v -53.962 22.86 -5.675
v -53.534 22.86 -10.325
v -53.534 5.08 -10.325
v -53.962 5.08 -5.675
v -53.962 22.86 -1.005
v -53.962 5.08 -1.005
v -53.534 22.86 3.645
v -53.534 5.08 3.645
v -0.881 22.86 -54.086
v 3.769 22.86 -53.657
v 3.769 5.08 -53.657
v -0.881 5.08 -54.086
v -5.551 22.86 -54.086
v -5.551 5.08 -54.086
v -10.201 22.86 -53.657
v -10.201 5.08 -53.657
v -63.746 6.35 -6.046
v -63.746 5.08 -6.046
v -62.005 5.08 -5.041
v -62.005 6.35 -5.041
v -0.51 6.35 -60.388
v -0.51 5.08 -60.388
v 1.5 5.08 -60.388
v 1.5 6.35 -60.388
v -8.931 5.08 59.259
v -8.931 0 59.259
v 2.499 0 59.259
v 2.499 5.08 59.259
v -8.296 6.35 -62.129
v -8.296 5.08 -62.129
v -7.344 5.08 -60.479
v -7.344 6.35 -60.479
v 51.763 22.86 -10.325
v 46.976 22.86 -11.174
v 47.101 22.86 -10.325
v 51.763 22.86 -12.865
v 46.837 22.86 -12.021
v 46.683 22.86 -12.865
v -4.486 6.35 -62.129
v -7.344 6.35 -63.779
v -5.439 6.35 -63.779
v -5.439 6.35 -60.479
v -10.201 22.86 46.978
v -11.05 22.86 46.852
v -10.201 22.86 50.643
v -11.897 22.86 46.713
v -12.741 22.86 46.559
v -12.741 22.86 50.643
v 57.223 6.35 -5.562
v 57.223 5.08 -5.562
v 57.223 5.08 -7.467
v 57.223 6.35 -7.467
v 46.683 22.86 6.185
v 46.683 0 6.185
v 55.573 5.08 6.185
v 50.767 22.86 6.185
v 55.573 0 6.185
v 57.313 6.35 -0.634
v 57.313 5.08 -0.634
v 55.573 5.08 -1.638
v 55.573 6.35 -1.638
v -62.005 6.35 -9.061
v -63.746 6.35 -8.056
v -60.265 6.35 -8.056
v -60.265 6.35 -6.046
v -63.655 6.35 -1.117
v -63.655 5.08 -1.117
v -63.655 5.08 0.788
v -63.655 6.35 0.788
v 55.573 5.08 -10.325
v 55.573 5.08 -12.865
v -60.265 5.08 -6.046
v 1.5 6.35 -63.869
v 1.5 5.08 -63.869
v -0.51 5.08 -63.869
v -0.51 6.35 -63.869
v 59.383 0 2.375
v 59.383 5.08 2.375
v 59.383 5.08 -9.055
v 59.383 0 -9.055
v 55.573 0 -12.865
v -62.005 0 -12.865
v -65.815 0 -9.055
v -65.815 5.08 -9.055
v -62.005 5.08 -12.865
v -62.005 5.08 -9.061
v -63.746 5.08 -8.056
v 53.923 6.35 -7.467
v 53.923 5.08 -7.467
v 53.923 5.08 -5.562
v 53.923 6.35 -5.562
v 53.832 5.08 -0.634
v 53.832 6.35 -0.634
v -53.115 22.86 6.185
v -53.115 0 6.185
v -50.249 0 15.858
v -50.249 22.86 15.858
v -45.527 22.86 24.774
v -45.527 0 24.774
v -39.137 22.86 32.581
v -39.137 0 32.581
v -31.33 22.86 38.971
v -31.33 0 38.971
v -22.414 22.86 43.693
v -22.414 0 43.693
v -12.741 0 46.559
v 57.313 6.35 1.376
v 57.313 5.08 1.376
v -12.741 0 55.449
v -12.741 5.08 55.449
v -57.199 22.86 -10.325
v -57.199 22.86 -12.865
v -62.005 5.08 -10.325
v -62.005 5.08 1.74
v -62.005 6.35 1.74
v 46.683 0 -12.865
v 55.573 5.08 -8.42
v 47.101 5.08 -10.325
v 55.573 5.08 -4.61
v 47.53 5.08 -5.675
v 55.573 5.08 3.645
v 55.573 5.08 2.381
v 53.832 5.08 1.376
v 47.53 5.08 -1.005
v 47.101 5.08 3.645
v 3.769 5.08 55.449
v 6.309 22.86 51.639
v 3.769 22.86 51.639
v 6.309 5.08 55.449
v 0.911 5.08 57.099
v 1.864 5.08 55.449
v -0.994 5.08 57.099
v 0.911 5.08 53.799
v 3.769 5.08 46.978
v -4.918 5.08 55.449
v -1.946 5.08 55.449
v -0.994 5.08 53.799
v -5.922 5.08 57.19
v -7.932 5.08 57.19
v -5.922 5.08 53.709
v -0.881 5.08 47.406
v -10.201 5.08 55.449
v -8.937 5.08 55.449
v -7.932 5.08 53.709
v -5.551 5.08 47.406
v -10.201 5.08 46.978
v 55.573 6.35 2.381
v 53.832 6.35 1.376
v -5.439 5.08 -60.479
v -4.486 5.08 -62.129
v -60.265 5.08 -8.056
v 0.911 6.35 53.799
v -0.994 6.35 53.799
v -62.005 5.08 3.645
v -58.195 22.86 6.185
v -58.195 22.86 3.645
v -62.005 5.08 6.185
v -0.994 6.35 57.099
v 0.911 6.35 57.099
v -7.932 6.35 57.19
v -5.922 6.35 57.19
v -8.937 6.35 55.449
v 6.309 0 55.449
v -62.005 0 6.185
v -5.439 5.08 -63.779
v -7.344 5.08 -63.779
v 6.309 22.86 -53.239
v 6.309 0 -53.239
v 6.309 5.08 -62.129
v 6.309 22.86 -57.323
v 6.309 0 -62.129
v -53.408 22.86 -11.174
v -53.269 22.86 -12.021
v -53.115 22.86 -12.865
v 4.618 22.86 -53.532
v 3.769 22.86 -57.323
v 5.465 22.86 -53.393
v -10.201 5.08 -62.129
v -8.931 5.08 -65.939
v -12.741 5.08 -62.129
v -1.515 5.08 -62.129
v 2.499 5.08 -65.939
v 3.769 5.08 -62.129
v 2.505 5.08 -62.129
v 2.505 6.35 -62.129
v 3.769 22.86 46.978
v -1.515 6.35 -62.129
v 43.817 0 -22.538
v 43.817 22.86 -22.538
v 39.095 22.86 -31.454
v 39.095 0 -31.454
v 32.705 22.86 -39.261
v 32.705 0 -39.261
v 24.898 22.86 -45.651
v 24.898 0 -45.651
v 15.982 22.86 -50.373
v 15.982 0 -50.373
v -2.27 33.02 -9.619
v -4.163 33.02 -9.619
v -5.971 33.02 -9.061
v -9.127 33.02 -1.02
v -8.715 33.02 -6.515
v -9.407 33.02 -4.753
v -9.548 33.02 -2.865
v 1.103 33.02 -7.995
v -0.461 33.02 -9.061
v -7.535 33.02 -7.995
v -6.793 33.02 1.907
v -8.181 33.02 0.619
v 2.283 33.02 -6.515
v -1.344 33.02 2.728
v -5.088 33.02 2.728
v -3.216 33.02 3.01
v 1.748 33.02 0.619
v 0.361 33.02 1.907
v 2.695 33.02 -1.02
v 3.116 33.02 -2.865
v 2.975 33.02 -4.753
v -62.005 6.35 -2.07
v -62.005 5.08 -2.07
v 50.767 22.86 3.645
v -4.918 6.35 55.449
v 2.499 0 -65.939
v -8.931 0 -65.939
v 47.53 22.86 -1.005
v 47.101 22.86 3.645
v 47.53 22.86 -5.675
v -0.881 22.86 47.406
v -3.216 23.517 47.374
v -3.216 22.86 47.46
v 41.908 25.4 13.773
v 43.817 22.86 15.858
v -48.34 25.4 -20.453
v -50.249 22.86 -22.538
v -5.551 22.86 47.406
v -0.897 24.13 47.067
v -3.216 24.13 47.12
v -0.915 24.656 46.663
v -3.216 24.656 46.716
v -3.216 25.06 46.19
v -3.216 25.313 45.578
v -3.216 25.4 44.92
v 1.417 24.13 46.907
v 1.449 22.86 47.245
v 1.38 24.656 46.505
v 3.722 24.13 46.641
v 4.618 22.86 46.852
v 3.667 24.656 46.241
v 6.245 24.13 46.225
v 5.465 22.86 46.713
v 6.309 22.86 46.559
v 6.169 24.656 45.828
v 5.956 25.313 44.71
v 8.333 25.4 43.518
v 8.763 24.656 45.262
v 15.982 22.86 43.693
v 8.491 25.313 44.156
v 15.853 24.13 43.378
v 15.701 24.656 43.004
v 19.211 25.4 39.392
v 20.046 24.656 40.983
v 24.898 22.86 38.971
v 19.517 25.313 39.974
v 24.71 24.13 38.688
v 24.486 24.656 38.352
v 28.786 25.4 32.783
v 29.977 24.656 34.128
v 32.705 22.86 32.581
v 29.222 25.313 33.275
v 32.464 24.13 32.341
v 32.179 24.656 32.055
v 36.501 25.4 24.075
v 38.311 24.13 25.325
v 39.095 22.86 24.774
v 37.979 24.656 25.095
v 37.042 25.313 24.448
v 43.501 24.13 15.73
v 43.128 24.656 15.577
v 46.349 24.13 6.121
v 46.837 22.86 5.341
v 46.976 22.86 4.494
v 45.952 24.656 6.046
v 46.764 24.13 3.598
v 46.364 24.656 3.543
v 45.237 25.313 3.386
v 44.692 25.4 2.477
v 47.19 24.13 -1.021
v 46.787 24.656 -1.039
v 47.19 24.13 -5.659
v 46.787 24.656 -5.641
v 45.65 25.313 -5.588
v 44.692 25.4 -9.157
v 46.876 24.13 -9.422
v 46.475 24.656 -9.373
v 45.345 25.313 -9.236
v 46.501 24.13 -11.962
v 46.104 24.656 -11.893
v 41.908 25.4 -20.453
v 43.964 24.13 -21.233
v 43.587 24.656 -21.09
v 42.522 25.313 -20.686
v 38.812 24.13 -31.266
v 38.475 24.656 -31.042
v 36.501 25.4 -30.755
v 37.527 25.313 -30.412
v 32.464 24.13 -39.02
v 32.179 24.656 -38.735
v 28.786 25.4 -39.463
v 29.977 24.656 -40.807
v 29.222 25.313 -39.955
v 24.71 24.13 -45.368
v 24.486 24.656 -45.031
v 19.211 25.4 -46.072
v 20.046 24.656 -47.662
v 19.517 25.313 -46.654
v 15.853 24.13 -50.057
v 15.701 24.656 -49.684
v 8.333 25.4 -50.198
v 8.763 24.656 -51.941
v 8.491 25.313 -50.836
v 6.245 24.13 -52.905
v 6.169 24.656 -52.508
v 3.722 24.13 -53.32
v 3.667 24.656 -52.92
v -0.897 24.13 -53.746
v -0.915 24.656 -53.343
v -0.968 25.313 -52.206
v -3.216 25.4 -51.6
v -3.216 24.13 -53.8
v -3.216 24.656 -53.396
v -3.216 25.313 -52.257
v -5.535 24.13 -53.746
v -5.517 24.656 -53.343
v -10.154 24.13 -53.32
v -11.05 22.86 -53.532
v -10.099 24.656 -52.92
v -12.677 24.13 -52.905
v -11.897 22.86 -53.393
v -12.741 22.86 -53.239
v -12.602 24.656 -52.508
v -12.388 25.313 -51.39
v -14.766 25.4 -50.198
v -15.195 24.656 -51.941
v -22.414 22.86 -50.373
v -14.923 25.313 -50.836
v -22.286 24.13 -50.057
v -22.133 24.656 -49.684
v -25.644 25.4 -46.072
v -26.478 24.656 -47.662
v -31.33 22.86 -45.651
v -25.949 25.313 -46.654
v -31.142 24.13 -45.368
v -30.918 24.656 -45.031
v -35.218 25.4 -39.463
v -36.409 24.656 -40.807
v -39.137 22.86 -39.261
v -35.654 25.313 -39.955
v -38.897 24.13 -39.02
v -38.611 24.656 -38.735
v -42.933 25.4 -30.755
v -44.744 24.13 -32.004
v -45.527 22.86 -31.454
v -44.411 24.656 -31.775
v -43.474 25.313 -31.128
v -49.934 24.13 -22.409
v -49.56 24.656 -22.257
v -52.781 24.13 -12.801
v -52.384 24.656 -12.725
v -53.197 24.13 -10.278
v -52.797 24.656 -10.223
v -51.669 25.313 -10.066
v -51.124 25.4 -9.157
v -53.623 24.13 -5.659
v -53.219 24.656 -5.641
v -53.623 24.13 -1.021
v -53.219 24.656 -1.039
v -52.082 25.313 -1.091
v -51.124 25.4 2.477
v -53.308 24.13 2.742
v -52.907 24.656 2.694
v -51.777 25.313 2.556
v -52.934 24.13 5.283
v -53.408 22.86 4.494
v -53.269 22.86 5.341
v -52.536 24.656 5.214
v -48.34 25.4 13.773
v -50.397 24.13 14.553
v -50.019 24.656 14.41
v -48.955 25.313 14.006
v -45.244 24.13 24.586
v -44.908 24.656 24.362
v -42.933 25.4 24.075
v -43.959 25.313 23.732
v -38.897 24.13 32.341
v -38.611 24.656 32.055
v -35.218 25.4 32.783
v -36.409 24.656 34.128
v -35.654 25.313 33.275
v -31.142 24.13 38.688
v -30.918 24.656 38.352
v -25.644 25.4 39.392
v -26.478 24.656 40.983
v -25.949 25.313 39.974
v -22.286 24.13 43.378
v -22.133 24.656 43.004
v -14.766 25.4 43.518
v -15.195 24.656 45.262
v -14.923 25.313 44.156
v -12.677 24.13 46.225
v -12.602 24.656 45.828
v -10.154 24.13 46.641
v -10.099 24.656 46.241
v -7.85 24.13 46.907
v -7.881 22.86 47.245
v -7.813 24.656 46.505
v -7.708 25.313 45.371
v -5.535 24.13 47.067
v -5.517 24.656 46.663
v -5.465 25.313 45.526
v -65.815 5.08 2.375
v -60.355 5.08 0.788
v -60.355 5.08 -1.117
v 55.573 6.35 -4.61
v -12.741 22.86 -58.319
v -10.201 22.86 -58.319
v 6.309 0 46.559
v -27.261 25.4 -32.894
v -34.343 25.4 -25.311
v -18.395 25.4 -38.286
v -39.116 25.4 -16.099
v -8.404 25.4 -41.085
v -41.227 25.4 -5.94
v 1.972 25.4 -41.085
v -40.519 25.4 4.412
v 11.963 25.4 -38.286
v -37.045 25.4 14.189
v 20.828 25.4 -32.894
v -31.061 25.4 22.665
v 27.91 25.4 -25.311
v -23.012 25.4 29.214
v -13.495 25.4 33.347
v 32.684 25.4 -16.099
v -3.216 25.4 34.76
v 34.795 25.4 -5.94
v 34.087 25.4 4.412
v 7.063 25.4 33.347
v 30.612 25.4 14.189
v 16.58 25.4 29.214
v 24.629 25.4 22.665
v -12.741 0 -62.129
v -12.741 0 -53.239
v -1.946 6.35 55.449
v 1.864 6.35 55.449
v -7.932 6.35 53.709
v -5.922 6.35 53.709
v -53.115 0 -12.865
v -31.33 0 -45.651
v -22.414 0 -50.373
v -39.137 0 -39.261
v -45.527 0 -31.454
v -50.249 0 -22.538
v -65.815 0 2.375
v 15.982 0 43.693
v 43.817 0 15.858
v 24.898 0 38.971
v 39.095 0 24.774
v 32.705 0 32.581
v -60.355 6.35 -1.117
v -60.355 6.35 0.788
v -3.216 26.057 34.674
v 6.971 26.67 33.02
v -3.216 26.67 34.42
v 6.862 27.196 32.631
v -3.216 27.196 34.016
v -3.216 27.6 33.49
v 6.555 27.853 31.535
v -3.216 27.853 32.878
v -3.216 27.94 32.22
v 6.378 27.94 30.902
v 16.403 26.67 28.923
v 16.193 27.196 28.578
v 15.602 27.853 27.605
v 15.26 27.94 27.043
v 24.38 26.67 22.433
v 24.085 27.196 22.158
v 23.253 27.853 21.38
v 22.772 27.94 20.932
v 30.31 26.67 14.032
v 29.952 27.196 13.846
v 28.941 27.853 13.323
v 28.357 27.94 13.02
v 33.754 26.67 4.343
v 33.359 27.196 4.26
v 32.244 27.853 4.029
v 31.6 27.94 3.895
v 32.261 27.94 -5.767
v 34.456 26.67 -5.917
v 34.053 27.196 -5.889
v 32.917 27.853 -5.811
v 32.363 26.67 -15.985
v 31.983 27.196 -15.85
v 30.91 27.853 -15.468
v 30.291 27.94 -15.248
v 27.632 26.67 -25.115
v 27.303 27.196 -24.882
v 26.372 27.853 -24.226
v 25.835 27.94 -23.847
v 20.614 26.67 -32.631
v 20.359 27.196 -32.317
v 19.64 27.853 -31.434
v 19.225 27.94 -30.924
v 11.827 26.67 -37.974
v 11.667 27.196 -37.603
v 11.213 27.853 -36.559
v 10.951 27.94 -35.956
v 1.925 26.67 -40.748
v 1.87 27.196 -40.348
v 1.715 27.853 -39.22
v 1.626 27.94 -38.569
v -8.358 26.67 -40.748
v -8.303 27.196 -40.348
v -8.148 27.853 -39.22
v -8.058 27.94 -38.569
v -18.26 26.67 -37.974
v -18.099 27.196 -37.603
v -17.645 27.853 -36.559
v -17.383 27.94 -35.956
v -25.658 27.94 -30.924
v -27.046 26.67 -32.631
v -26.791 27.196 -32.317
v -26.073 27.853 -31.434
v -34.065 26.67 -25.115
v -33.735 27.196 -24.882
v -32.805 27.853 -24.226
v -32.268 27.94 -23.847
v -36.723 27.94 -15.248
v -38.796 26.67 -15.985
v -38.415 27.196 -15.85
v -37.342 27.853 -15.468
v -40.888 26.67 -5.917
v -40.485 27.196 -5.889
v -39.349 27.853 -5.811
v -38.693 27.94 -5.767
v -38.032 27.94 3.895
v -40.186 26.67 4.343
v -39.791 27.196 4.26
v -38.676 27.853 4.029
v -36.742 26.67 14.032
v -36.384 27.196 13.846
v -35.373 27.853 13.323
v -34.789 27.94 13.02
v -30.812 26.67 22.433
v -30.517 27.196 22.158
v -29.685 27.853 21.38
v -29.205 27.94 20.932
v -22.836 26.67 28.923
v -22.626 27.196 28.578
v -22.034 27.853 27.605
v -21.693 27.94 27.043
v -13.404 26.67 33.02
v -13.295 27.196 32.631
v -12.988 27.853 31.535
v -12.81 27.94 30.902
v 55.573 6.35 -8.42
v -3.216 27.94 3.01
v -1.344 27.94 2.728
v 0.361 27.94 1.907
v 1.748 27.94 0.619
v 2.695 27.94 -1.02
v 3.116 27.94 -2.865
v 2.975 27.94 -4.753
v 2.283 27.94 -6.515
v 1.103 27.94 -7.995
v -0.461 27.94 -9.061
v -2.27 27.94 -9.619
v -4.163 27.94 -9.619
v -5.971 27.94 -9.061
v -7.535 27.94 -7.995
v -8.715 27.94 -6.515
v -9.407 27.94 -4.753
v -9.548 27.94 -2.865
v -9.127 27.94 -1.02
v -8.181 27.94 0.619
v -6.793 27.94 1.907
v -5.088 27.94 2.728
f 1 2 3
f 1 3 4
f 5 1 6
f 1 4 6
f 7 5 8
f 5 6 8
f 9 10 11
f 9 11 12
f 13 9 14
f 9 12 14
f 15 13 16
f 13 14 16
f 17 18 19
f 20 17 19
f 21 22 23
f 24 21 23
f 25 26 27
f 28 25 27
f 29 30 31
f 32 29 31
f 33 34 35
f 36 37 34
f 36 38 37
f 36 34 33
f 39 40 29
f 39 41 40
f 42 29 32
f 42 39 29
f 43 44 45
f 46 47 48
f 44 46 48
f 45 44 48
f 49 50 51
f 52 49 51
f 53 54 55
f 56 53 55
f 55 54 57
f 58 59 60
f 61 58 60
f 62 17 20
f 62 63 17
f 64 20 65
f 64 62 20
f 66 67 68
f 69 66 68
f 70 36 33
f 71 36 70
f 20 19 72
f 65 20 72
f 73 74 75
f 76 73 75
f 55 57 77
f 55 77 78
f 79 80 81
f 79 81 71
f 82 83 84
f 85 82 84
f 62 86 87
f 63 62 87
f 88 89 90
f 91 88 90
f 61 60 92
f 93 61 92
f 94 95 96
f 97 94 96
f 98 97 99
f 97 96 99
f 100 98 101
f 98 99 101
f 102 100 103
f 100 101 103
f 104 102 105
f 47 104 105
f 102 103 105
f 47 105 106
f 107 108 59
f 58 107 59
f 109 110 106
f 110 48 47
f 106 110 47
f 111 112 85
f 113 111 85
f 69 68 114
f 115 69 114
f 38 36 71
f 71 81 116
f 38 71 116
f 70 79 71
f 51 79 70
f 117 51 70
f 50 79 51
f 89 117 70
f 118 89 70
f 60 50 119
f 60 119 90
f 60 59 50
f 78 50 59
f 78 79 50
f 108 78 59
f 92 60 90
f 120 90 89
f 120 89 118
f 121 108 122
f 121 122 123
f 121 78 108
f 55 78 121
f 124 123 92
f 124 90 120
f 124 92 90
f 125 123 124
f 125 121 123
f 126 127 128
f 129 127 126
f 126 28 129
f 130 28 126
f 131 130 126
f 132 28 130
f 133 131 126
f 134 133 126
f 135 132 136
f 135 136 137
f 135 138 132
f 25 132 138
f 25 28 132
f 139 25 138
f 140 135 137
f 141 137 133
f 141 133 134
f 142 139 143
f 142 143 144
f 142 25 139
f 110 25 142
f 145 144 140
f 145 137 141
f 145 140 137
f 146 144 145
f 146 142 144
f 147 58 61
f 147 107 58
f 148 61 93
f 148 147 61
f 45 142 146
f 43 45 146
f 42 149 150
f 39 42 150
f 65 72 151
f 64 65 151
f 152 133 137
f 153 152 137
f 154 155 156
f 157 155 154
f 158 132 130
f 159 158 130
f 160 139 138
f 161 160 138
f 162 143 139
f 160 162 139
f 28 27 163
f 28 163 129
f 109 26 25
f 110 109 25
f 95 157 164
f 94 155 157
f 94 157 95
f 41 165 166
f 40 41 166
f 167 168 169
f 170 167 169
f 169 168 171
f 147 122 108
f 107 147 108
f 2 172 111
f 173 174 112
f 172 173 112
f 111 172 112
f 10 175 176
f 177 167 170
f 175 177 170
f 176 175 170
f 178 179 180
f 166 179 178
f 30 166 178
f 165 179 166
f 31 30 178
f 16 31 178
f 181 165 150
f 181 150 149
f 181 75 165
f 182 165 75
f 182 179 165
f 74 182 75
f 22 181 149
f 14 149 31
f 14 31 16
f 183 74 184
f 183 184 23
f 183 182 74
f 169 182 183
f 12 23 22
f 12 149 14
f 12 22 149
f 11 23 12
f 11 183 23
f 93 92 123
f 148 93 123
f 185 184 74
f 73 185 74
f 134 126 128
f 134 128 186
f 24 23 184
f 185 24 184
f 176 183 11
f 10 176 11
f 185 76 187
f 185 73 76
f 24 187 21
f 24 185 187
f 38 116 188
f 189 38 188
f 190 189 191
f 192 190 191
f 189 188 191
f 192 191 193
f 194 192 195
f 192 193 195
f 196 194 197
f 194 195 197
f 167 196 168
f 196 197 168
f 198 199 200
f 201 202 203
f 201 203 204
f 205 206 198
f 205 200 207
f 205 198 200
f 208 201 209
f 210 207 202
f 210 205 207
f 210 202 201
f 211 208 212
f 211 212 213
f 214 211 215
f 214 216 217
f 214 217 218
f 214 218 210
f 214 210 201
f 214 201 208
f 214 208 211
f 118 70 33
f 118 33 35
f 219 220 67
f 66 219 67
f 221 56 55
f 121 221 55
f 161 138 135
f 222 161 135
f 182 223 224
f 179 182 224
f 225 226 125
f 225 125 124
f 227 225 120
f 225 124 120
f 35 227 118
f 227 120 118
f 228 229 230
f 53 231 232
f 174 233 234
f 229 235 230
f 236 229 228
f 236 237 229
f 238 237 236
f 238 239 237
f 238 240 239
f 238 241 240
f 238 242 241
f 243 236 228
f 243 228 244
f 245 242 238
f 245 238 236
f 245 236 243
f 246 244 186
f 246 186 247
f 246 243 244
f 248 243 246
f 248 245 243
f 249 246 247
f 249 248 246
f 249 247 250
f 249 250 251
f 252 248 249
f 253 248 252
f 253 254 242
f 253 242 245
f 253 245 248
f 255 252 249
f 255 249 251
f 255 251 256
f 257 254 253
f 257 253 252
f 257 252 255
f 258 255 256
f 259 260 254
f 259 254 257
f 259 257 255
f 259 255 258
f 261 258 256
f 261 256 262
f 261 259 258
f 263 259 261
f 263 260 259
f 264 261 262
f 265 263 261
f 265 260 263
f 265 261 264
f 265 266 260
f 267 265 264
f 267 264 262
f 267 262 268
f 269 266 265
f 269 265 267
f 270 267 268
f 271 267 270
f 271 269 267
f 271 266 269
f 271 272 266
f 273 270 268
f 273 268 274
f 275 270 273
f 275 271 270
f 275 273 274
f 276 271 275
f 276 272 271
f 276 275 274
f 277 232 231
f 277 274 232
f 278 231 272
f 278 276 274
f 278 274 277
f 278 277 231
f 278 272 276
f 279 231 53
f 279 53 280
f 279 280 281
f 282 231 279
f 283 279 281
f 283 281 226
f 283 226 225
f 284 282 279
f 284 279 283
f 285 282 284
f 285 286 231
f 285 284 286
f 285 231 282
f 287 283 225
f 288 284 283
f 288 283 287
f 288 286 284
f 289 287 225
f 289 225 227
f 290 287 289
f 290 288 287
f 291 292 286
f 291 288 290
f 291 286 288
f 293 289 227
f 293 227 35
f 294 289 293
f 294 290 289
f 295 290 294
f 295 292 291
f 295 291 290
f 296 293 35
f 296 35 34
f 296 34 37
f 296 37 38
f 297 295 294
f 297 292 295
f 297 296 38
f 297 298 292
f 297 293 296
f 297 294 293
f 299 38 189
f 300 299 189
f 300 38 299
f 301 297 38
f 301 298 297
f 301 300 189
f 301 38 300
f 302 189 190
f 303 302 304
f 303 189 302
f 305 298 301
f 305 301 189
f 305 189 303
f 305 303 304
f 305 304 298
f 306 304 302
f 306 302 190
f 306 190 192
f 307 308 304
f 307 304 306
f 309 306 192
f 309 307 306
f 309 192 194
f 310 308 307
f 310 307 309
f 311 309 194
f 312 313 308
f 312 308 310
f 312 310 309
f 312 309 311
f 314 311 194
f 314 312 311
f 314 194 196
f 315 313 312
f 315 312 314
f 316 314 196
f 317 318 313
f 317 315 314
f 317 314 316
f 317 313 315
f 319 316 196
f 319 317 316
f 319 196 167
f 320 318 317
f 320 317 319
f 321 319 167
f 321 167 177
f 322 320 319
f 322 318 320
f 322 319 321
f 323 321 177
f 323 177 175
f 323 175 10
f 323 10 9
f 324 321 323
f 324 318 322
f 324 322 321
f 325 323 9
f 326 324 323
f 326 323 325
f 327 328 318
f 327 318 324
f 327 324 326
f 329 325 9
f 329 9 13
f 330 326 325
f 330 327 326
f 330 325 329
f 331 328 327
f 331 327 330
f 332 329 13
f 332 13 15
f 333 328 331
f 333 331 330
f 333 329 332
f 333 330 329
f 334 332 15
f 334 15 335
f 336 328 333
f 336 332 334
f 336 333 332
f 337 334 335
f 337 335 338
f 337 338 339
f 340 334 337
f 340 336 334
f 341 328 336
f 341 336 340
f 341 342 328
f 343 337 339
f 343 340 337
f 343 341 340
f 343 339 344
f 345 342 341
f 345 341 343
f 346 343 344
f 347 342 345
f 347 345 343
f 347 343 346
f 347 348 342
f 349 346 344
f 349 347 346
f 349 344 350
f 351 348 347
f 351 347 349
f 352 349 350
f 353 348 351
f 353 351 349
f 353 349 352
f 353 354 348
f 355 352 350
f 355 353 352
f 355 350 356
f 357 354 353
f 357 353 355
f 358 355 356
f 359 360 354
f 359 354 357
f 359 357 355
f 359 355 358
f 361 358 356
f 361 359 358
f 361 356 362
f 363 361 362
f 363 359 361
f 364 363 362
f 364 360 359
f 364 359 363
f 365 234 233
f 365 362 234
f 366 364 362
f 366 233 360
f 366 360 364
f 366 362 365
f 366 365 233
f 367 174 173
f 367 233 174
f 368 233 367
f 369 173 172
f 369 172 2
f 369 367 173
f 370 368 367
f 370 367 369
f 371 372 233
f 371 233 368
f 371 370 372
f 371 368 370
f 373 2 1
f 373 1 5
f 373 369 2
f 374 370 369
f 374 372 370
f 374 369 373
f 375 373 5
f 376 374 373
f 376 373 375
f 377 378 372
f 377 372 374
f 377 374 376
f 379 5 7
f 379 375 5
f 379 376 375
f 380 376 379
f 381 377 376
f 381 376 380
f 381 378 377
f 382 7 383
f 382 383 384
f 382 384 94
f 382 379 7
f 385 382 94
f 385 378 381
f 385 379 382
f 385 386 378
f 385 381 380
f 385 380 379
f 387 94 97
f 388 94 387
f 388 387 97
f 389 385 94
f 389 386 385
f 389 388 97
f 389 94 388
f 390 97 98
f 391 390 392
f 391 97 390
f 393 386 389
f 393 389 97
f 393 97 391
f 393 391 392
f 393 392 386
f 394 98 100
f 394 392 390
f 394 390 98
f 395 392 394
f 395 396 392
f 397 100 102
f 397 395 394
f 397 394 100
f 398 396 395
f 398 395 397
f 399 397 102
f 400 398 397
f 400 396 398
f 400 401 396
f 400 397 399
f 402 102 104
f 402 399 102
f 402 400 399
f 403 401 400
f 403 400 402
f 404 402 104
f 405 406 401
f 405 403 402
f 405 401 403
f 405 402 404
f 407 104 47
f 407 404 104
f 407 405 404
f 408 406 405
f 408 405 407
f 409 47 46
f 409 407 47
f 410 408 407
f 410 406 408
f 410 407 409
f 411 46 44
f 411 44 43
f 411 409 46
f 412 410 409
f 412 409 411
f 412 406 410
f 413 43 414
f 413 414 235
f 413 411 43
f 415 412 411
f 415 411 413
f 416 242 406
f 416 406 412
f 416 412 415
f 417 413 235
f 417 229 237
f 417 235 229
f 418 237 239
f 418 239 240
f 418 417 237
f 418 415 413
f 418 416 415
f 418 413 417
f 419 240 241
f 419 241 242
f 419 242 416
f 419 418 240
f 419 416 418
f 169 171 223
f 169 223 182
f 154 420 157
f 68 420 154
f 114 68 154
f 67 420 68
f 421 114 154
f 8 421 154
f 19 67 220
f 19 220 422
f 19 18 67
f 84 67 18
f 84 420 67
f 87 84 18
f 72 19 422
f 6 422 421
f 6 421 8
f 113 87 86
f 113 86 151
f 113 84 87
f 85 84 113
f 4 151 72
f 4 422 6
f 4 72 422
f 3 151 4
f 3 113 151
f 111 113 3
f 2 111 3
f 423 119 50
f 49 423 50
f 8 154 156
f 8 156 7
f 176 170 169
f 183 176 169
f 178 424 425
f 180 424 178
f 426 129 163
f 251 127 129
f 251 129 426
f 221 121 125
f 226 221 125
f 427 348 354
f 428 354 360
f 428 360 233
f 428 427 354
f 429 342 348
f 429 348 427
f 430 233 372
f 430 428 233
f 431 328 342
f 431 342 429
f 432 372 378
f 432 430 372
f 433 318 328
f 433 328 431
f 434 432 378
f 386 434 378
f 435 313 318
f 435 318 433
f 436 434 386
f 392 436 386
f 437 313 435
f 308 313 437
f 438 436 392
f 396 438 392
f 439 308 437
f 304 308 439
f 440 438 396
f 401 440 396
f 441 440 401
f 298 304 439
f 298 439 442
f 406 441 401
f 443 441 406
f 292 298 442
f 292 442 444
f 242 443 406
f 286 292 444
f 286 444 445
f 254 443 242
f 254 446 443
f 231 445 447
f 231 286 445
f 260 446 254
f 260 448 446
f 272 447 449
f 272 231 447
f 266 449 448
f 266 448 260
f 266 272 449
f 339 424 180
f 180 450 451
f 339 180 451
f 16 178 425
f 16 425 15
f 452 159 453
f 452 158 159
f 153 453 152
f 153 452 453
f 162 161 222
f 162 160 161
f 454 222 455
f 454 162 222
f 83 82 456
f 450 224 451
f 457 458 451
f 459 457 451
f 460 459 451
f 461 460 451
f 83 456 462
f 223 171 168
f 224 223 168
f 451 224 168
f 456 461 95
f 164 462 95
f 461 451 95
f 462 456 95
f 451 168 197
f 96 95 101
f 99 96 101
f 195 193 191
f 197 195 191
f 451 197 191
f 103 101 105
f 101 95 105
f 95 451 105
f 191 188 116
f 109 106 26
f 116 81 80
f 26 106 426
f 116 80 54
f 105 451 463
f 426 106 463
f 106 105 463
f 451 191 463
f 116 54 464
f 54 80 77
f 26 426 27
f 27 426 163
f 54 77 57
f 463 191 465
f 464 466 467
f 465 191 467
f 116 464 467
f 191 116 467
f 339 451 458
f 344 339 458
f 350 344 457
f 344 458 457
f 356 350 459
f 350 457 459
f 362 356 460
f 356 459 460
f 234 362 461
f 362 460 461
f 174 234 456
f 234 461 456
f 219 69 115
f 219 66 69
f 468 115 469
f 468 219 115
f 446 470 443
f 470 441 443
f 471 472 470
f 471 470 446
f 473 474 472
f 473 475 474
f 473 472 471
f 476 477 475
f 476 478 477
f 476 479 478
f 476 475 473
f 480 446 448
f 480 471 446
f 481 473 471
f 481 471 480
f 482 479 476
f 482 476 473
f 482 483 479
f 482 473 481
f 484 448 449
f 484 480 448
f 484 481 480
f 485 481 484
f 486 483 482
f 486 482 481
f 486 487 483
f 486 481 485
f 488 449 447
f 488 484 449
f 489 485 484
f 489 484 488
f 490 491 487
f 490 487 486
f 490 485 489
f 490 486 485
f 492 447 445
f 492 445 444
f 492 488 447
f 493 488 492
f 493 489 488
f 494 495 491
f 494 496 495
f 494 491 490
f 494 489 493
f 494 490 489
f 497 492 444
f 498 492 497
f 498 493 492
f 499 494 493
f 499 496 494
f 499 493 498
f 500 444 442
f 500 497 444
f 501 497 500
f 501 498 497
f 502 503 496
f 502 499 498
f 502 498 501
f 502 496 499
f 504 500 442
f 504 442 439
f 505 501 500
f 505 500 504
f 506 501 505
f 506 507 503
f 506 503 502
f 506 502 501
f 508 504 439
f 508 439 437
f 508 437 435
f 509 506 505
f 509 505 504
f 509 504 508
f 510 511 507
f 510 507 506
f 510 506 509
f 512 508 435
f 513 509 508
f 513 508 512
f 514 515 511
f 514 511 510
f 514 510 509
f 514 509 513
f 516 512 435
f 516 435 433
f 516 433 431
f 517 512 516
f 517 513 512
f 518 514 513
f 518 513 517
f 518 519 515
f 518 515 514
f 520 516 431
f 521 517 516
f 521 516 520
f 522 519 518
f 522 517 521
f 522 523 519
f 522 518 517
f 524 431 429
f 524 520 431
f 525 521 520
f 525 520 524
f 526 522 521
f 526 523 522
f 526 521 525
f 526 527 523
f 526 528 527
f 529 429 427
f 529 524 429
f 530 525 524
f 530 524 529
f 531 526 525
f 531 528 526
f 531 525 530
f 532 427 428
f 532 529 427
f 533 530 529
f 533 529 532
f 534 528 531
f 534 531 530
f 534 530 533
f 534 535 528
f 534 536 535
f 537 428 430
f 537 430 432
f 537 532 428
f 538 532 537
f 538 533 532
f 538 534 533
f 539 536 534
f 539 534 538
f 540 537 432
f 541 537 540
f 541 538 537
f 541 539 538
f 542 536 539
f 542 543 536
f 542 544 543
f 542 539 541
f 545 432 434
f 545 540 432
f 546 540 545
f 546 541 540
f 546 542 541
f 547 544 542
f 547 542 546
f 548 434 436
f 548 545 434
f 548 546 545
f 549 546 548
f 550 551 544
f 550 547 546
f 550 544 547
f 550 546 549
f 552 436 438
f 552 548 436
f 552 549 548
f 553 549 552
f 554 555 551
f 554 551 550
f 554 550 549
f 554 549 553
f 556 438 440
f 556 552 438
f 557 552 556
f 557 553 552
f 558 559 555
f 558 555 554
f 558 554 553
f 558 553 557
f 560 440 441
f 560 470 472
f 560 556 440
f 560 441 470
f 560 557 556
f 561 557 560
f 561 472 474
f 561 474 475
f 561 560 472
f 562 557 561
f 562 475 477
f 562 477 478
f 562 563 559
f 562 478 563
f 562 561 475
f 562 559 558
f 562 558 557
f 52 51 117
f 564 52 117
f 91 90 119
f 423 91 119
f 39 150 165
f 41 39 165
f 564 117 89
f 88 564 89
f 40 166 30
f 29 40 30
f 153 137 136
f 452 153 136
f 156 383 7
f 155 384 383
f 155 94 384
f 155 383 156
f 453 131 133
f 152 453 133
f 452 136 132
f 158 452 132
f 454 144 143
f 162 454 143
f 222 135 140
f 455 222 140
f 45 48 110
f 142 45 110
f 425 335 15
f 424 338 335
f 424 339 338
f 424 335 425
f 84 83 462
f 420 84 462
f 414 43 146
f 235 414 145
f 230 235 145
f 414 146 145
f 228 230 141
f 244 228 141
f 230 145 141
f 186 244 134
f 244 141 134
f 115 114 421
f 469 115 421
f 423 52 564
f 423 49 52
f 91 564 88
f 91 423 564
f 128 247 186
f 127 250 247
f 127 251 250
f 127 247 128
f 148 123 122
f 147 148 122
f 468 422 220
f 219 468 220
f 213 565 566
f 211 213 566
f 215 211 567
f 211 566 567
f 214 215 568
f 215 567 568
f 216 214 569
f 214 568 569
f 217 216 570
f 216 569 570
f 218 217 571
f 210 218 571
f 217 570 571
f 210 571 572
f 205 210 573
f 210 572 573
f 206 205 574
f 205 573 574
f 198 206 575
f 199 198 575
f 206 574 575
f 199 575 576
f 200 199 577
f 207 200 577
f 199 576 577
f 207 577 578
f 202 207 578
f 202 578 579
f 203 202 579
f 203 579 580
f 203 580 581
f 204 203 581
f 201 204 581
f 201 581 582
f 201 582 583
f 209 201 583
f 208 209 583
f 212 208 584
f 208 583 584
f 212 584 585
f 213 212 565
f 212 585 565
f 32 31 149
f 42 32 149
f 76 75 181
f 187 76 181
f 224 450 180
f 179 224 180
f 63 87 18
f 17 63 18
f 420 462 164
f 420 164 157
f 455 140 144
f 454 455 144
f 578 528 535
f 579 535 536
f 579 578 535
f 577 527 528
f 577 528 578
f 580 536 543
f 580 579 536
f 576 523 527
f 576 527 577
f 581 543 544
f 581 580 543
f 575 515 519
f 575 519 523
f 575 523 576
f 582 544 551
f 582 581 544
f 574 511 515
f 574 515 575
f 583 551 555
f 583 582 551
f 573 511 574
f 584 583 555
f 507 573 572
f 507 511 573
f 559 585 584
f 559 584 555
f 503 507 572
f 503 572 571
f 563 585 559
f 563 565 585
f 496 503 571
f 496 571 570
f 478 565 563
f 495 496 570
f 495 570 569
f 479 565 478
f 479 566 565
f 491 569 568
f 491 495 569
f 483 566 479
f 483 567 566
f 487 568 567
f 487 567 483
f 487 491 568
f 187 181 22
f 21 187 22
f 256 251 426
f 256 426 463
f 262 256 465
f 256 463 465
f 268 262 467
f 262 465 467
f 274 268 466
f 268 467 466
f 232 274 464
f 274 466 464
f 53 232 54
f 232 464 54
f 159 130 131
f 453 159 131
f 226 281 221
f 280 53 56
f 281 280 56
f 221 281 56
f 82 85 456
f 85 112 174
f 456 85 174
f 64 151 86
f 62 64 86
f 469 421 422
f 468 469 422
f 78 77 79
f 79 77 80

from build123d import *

# Parameters (mm, degrees)
SKETCH2_R                    = 50.8
BOSS_EXTRUDE1_DEPTH          = 25.4
FILLET1_R                    = 2.54
BOSS_EXTRUDE2_START          = -25.4
BOSS_EXTRUDE2_DEPTH          = 5.08
CHAMFER1_SIZE                = 3.81
BOSS_EXTRUDE3_DEPTH          = 2.54
BOSS_EXTRUDE4_DEPTH          = 1.27
BOSS_EXTRUDE6_DEPTH          = 2.54
BOSS_EXTRUDE7_DEPTH          = 1.27
CIRPATTERN1_COUNT            = 4
CHAMFER1_OF_CIRPATTERN1_SIZE = 3.81
CIRPATTERN2_COUNT            = 4
SKETCH12_R                   = 38.1
BOSS_EXTRUDE8_DEPTH          = 2.54
FILLET2_R                    = 2.54
SKETCH13_R                   = 6.35
BOSS_EXTRUDE9_DEPTH          = 5.08


with BuildPart() as part:
    # Sketch2 → Boss-Extrude1 (new body)
    with BuildSketch(Plane(origin=(0, 0, 0), x_dir=(1, 0, 0), z_dir=(0, 1, 0))):
        with Locations(Location((-3.216165312, 3.339863978, 0), (0, 0, 270))):
            Circle(SKETCH2_R)
    extrude(amount=BOSS_EXTRUDE1_DEPTH)

    # Fillet1
    fillet1_edges = [part.edges().sort_by_distance(p)[0] for p in [
        (-3.216165312, 25.4, -54.139863978),
    ]]
    fillet(fillet1_edges, radius=FILLET1_R)

    # Sketch3 → Boss-Extrude2 (add)
    with BuildSketch(Plane(origin=(0, 25.4, 0), x_dir=(1, 0, 0), z_dir=(0, 1, 0)).offset(BOSS_EXTRUDE2_START)):
        with BuildLine():
            Line((-53.115207137, 12.864863978), (-65.815207137, 12.864863978))
            Line((-65.815207137, 12.864863978), (-65.815207137, -6.185136022))
            Line((-65.815207137, -6.185136022), (-53.115207137, -6.185136022))
            ThreePointArc((-53.115207137, -6.185136022), (-54.016165312, 3.339863978), (-53.115207137, 12.864863978))
        make_face()
    boss_extrude2 = extrude(amount=BOSS_EXTRUDE2_DEPTH)

    # Chamfer1
    chamfer1_edges = [part.edges().sort_by_distance(p)[0] for p in [
        (-65.815207137, 2.54, -12.864863978),
        (-65.815207137, 2.54, 6.185136022),
    ]]
    chamfer(chamfer1_edges, length=CHAMFER1_SIZE)

    # Sketch4 → Boss-Extrude3 (add)
    with BuildSketch(Plane.XY.offset(6.185136022)):
        Polygon((-53.115207137, 5.08), (-53.115207137, 22.86), (-58.195207137, 22.86), (-62.005207137, 5.08), align=None)
    boss_extrude3 = extrude(amount=-BOSS_EXTRUDE3_DEPTH)

    # Sketch5 → Boss-Extrude4 (add)
    with BuildSketch(Plane(origin=(0, 5.08, 0), x_dir=(1, 0, 0), z_dir=(0, 1, 0))):
        Polygon((-63.654985531, -0.787636022), (-62.005207137, -1.740136022), (-60.355428742, -0.787636022), (-60.355428742, 1.117363978), (-62.005207137, 2.069863978), (-63.654985531, 1.117363978), align=None)
    boss_extrude4 = extrude(amount=BOSS_EXTRUDE4_DEPTH)

    # Sketch10 → Boss-Extrude6 (add)
    with BuildSketch(Plane(origin=(0, 0, -12.864863978), x_dir=(-1, 0, 0), z_dir=(0, 0, -1))):
        Polygon((53.115207137, 5.08), (53.115207137, 22.86), (57.19920047, 22.86), (62.005207137, 5.08), align=None)
    boss_extrude6 = extrude(amount=-BOSS_EXTRUDE6_DEPTH)

    # Sketch11 → Boss-Extrude7 (add)
    with BuildSketch(Plane(origin=(0, 5.08, 0), x_dir=(1, 0, 0), z_dir=(0, 1, 0))):
        Polygon((-63.745716673, 6.046159142), (-62.005207137, 5.041275493), (-60.264697601, 6.046159142), (-60.264697601, 8.05592644), (-62.005207137, 9.060810089), (-63.745716673, 8.05592644), align=None)
    boss_extrude7 = extrude(amount=BOSS_EXTRUDE7_DEPTH)

    # CirPattern1: Boss-Extrude2, Boss-Extrude3, Boss-Extrude6 ×4 about axis
    cirpattern1_axis = Axis((-3.216165312, 0, -3.339863978), (0, 1, 0))
    add([boss_extrude2.rotate(cirpattern1_axis, i * 360 / CIRPATTERN1_COUNT) for i in range(1, CIRPATTERN1_COUNT)])
    add([boss_extrude3.rotate(cirpattern1_axis, i * 360 / CIRPATTERN1_COUNT) for i in range(1, CIRPATTERN1_COUNT)])
    add([boss_extrude6.rotate(cirpattern1_axis, i * 360 / CIRPATTERN1_COUNT) for i in range(1, CIRPATTERN1_COUNT)])

    # Chamfer1 of CirPattern1
    chamfer1_of_cirpattern1_edges = [part.edges().sort_by_distance(p)[0] for p in [
        (-12.741165312, 2.54, 59.259177846),
        (6.308834688, 2.54, 59.259177846),
        (59.382876512, 2.54, 6.185136022),
        (59.382876512, 2.54, -12.864863978),
        (6.308834688, 2.54, -65.938905803),
        (-12.741165312, 2.54, -65.938905803),
    ]]
    chamfer(chamfer1_of_cirpattern1_edges, length=CHAMFER1_OF_CIRPATTERN1_SIZE)

    # CirPattern2: Boss-Extrude4, Boss-Extrude7 ×4 about axis
    cirpattern2_axis = Axis((-3.216165312, 0, -3.339863978), (0, 1, 0))
    add([boss_extrude4.rotate(cirpattern2_axis, i * 360 / CIRPATTERN2_COUNT) for i in range(1, CIRPATTERN2_COUNT)])
    add([boss_extrude7.rotate(cirpattern2_axis, i * 360 / CIRPATTERN2_COUNT) for i in range(1, CIRPATTERN2_COUNT)])

    # Sketch12 → Boss-Extrude8 (add)
    with BuildSketch(Plane(origin=(0, 25.4, 0), x_dir=(1, 0, 0), z_dir=(0, 1, 0))):
        with Locations(Location((-3.216165312, 3.339863978, 0), (0, 0, 270))):
            Circle(SKETCH12_R)
    extrude(amount=BOSS_EXTRUDE8_DEPTH)

    # Fillet2
    fillet2_edges = [part.edges().sort_by_distance(p)[0] for p in [
        (-3.216165312, 27.94, -41.439863978),
    ]]
    fillet(fillet2_edges, radius=FILLET2_R - 0.0001)  # a hair under: the kernel refuses the full size

    # Sketch13 → Boss-Extrude9 (add)
    with BuildSketch(Plane(origin=(0, 27.94, 0), x_dir=(1, 0, 0), z_dir=(0, 1, 0))):
        with Locations(Location((-3.216165312, 3.339863978, 0), (0, 0, 270))):
            Circle(SKETCH13_R)
    extrude(amount=BOSS_EXTRUDE9_DEPTH)


solid = part.part
